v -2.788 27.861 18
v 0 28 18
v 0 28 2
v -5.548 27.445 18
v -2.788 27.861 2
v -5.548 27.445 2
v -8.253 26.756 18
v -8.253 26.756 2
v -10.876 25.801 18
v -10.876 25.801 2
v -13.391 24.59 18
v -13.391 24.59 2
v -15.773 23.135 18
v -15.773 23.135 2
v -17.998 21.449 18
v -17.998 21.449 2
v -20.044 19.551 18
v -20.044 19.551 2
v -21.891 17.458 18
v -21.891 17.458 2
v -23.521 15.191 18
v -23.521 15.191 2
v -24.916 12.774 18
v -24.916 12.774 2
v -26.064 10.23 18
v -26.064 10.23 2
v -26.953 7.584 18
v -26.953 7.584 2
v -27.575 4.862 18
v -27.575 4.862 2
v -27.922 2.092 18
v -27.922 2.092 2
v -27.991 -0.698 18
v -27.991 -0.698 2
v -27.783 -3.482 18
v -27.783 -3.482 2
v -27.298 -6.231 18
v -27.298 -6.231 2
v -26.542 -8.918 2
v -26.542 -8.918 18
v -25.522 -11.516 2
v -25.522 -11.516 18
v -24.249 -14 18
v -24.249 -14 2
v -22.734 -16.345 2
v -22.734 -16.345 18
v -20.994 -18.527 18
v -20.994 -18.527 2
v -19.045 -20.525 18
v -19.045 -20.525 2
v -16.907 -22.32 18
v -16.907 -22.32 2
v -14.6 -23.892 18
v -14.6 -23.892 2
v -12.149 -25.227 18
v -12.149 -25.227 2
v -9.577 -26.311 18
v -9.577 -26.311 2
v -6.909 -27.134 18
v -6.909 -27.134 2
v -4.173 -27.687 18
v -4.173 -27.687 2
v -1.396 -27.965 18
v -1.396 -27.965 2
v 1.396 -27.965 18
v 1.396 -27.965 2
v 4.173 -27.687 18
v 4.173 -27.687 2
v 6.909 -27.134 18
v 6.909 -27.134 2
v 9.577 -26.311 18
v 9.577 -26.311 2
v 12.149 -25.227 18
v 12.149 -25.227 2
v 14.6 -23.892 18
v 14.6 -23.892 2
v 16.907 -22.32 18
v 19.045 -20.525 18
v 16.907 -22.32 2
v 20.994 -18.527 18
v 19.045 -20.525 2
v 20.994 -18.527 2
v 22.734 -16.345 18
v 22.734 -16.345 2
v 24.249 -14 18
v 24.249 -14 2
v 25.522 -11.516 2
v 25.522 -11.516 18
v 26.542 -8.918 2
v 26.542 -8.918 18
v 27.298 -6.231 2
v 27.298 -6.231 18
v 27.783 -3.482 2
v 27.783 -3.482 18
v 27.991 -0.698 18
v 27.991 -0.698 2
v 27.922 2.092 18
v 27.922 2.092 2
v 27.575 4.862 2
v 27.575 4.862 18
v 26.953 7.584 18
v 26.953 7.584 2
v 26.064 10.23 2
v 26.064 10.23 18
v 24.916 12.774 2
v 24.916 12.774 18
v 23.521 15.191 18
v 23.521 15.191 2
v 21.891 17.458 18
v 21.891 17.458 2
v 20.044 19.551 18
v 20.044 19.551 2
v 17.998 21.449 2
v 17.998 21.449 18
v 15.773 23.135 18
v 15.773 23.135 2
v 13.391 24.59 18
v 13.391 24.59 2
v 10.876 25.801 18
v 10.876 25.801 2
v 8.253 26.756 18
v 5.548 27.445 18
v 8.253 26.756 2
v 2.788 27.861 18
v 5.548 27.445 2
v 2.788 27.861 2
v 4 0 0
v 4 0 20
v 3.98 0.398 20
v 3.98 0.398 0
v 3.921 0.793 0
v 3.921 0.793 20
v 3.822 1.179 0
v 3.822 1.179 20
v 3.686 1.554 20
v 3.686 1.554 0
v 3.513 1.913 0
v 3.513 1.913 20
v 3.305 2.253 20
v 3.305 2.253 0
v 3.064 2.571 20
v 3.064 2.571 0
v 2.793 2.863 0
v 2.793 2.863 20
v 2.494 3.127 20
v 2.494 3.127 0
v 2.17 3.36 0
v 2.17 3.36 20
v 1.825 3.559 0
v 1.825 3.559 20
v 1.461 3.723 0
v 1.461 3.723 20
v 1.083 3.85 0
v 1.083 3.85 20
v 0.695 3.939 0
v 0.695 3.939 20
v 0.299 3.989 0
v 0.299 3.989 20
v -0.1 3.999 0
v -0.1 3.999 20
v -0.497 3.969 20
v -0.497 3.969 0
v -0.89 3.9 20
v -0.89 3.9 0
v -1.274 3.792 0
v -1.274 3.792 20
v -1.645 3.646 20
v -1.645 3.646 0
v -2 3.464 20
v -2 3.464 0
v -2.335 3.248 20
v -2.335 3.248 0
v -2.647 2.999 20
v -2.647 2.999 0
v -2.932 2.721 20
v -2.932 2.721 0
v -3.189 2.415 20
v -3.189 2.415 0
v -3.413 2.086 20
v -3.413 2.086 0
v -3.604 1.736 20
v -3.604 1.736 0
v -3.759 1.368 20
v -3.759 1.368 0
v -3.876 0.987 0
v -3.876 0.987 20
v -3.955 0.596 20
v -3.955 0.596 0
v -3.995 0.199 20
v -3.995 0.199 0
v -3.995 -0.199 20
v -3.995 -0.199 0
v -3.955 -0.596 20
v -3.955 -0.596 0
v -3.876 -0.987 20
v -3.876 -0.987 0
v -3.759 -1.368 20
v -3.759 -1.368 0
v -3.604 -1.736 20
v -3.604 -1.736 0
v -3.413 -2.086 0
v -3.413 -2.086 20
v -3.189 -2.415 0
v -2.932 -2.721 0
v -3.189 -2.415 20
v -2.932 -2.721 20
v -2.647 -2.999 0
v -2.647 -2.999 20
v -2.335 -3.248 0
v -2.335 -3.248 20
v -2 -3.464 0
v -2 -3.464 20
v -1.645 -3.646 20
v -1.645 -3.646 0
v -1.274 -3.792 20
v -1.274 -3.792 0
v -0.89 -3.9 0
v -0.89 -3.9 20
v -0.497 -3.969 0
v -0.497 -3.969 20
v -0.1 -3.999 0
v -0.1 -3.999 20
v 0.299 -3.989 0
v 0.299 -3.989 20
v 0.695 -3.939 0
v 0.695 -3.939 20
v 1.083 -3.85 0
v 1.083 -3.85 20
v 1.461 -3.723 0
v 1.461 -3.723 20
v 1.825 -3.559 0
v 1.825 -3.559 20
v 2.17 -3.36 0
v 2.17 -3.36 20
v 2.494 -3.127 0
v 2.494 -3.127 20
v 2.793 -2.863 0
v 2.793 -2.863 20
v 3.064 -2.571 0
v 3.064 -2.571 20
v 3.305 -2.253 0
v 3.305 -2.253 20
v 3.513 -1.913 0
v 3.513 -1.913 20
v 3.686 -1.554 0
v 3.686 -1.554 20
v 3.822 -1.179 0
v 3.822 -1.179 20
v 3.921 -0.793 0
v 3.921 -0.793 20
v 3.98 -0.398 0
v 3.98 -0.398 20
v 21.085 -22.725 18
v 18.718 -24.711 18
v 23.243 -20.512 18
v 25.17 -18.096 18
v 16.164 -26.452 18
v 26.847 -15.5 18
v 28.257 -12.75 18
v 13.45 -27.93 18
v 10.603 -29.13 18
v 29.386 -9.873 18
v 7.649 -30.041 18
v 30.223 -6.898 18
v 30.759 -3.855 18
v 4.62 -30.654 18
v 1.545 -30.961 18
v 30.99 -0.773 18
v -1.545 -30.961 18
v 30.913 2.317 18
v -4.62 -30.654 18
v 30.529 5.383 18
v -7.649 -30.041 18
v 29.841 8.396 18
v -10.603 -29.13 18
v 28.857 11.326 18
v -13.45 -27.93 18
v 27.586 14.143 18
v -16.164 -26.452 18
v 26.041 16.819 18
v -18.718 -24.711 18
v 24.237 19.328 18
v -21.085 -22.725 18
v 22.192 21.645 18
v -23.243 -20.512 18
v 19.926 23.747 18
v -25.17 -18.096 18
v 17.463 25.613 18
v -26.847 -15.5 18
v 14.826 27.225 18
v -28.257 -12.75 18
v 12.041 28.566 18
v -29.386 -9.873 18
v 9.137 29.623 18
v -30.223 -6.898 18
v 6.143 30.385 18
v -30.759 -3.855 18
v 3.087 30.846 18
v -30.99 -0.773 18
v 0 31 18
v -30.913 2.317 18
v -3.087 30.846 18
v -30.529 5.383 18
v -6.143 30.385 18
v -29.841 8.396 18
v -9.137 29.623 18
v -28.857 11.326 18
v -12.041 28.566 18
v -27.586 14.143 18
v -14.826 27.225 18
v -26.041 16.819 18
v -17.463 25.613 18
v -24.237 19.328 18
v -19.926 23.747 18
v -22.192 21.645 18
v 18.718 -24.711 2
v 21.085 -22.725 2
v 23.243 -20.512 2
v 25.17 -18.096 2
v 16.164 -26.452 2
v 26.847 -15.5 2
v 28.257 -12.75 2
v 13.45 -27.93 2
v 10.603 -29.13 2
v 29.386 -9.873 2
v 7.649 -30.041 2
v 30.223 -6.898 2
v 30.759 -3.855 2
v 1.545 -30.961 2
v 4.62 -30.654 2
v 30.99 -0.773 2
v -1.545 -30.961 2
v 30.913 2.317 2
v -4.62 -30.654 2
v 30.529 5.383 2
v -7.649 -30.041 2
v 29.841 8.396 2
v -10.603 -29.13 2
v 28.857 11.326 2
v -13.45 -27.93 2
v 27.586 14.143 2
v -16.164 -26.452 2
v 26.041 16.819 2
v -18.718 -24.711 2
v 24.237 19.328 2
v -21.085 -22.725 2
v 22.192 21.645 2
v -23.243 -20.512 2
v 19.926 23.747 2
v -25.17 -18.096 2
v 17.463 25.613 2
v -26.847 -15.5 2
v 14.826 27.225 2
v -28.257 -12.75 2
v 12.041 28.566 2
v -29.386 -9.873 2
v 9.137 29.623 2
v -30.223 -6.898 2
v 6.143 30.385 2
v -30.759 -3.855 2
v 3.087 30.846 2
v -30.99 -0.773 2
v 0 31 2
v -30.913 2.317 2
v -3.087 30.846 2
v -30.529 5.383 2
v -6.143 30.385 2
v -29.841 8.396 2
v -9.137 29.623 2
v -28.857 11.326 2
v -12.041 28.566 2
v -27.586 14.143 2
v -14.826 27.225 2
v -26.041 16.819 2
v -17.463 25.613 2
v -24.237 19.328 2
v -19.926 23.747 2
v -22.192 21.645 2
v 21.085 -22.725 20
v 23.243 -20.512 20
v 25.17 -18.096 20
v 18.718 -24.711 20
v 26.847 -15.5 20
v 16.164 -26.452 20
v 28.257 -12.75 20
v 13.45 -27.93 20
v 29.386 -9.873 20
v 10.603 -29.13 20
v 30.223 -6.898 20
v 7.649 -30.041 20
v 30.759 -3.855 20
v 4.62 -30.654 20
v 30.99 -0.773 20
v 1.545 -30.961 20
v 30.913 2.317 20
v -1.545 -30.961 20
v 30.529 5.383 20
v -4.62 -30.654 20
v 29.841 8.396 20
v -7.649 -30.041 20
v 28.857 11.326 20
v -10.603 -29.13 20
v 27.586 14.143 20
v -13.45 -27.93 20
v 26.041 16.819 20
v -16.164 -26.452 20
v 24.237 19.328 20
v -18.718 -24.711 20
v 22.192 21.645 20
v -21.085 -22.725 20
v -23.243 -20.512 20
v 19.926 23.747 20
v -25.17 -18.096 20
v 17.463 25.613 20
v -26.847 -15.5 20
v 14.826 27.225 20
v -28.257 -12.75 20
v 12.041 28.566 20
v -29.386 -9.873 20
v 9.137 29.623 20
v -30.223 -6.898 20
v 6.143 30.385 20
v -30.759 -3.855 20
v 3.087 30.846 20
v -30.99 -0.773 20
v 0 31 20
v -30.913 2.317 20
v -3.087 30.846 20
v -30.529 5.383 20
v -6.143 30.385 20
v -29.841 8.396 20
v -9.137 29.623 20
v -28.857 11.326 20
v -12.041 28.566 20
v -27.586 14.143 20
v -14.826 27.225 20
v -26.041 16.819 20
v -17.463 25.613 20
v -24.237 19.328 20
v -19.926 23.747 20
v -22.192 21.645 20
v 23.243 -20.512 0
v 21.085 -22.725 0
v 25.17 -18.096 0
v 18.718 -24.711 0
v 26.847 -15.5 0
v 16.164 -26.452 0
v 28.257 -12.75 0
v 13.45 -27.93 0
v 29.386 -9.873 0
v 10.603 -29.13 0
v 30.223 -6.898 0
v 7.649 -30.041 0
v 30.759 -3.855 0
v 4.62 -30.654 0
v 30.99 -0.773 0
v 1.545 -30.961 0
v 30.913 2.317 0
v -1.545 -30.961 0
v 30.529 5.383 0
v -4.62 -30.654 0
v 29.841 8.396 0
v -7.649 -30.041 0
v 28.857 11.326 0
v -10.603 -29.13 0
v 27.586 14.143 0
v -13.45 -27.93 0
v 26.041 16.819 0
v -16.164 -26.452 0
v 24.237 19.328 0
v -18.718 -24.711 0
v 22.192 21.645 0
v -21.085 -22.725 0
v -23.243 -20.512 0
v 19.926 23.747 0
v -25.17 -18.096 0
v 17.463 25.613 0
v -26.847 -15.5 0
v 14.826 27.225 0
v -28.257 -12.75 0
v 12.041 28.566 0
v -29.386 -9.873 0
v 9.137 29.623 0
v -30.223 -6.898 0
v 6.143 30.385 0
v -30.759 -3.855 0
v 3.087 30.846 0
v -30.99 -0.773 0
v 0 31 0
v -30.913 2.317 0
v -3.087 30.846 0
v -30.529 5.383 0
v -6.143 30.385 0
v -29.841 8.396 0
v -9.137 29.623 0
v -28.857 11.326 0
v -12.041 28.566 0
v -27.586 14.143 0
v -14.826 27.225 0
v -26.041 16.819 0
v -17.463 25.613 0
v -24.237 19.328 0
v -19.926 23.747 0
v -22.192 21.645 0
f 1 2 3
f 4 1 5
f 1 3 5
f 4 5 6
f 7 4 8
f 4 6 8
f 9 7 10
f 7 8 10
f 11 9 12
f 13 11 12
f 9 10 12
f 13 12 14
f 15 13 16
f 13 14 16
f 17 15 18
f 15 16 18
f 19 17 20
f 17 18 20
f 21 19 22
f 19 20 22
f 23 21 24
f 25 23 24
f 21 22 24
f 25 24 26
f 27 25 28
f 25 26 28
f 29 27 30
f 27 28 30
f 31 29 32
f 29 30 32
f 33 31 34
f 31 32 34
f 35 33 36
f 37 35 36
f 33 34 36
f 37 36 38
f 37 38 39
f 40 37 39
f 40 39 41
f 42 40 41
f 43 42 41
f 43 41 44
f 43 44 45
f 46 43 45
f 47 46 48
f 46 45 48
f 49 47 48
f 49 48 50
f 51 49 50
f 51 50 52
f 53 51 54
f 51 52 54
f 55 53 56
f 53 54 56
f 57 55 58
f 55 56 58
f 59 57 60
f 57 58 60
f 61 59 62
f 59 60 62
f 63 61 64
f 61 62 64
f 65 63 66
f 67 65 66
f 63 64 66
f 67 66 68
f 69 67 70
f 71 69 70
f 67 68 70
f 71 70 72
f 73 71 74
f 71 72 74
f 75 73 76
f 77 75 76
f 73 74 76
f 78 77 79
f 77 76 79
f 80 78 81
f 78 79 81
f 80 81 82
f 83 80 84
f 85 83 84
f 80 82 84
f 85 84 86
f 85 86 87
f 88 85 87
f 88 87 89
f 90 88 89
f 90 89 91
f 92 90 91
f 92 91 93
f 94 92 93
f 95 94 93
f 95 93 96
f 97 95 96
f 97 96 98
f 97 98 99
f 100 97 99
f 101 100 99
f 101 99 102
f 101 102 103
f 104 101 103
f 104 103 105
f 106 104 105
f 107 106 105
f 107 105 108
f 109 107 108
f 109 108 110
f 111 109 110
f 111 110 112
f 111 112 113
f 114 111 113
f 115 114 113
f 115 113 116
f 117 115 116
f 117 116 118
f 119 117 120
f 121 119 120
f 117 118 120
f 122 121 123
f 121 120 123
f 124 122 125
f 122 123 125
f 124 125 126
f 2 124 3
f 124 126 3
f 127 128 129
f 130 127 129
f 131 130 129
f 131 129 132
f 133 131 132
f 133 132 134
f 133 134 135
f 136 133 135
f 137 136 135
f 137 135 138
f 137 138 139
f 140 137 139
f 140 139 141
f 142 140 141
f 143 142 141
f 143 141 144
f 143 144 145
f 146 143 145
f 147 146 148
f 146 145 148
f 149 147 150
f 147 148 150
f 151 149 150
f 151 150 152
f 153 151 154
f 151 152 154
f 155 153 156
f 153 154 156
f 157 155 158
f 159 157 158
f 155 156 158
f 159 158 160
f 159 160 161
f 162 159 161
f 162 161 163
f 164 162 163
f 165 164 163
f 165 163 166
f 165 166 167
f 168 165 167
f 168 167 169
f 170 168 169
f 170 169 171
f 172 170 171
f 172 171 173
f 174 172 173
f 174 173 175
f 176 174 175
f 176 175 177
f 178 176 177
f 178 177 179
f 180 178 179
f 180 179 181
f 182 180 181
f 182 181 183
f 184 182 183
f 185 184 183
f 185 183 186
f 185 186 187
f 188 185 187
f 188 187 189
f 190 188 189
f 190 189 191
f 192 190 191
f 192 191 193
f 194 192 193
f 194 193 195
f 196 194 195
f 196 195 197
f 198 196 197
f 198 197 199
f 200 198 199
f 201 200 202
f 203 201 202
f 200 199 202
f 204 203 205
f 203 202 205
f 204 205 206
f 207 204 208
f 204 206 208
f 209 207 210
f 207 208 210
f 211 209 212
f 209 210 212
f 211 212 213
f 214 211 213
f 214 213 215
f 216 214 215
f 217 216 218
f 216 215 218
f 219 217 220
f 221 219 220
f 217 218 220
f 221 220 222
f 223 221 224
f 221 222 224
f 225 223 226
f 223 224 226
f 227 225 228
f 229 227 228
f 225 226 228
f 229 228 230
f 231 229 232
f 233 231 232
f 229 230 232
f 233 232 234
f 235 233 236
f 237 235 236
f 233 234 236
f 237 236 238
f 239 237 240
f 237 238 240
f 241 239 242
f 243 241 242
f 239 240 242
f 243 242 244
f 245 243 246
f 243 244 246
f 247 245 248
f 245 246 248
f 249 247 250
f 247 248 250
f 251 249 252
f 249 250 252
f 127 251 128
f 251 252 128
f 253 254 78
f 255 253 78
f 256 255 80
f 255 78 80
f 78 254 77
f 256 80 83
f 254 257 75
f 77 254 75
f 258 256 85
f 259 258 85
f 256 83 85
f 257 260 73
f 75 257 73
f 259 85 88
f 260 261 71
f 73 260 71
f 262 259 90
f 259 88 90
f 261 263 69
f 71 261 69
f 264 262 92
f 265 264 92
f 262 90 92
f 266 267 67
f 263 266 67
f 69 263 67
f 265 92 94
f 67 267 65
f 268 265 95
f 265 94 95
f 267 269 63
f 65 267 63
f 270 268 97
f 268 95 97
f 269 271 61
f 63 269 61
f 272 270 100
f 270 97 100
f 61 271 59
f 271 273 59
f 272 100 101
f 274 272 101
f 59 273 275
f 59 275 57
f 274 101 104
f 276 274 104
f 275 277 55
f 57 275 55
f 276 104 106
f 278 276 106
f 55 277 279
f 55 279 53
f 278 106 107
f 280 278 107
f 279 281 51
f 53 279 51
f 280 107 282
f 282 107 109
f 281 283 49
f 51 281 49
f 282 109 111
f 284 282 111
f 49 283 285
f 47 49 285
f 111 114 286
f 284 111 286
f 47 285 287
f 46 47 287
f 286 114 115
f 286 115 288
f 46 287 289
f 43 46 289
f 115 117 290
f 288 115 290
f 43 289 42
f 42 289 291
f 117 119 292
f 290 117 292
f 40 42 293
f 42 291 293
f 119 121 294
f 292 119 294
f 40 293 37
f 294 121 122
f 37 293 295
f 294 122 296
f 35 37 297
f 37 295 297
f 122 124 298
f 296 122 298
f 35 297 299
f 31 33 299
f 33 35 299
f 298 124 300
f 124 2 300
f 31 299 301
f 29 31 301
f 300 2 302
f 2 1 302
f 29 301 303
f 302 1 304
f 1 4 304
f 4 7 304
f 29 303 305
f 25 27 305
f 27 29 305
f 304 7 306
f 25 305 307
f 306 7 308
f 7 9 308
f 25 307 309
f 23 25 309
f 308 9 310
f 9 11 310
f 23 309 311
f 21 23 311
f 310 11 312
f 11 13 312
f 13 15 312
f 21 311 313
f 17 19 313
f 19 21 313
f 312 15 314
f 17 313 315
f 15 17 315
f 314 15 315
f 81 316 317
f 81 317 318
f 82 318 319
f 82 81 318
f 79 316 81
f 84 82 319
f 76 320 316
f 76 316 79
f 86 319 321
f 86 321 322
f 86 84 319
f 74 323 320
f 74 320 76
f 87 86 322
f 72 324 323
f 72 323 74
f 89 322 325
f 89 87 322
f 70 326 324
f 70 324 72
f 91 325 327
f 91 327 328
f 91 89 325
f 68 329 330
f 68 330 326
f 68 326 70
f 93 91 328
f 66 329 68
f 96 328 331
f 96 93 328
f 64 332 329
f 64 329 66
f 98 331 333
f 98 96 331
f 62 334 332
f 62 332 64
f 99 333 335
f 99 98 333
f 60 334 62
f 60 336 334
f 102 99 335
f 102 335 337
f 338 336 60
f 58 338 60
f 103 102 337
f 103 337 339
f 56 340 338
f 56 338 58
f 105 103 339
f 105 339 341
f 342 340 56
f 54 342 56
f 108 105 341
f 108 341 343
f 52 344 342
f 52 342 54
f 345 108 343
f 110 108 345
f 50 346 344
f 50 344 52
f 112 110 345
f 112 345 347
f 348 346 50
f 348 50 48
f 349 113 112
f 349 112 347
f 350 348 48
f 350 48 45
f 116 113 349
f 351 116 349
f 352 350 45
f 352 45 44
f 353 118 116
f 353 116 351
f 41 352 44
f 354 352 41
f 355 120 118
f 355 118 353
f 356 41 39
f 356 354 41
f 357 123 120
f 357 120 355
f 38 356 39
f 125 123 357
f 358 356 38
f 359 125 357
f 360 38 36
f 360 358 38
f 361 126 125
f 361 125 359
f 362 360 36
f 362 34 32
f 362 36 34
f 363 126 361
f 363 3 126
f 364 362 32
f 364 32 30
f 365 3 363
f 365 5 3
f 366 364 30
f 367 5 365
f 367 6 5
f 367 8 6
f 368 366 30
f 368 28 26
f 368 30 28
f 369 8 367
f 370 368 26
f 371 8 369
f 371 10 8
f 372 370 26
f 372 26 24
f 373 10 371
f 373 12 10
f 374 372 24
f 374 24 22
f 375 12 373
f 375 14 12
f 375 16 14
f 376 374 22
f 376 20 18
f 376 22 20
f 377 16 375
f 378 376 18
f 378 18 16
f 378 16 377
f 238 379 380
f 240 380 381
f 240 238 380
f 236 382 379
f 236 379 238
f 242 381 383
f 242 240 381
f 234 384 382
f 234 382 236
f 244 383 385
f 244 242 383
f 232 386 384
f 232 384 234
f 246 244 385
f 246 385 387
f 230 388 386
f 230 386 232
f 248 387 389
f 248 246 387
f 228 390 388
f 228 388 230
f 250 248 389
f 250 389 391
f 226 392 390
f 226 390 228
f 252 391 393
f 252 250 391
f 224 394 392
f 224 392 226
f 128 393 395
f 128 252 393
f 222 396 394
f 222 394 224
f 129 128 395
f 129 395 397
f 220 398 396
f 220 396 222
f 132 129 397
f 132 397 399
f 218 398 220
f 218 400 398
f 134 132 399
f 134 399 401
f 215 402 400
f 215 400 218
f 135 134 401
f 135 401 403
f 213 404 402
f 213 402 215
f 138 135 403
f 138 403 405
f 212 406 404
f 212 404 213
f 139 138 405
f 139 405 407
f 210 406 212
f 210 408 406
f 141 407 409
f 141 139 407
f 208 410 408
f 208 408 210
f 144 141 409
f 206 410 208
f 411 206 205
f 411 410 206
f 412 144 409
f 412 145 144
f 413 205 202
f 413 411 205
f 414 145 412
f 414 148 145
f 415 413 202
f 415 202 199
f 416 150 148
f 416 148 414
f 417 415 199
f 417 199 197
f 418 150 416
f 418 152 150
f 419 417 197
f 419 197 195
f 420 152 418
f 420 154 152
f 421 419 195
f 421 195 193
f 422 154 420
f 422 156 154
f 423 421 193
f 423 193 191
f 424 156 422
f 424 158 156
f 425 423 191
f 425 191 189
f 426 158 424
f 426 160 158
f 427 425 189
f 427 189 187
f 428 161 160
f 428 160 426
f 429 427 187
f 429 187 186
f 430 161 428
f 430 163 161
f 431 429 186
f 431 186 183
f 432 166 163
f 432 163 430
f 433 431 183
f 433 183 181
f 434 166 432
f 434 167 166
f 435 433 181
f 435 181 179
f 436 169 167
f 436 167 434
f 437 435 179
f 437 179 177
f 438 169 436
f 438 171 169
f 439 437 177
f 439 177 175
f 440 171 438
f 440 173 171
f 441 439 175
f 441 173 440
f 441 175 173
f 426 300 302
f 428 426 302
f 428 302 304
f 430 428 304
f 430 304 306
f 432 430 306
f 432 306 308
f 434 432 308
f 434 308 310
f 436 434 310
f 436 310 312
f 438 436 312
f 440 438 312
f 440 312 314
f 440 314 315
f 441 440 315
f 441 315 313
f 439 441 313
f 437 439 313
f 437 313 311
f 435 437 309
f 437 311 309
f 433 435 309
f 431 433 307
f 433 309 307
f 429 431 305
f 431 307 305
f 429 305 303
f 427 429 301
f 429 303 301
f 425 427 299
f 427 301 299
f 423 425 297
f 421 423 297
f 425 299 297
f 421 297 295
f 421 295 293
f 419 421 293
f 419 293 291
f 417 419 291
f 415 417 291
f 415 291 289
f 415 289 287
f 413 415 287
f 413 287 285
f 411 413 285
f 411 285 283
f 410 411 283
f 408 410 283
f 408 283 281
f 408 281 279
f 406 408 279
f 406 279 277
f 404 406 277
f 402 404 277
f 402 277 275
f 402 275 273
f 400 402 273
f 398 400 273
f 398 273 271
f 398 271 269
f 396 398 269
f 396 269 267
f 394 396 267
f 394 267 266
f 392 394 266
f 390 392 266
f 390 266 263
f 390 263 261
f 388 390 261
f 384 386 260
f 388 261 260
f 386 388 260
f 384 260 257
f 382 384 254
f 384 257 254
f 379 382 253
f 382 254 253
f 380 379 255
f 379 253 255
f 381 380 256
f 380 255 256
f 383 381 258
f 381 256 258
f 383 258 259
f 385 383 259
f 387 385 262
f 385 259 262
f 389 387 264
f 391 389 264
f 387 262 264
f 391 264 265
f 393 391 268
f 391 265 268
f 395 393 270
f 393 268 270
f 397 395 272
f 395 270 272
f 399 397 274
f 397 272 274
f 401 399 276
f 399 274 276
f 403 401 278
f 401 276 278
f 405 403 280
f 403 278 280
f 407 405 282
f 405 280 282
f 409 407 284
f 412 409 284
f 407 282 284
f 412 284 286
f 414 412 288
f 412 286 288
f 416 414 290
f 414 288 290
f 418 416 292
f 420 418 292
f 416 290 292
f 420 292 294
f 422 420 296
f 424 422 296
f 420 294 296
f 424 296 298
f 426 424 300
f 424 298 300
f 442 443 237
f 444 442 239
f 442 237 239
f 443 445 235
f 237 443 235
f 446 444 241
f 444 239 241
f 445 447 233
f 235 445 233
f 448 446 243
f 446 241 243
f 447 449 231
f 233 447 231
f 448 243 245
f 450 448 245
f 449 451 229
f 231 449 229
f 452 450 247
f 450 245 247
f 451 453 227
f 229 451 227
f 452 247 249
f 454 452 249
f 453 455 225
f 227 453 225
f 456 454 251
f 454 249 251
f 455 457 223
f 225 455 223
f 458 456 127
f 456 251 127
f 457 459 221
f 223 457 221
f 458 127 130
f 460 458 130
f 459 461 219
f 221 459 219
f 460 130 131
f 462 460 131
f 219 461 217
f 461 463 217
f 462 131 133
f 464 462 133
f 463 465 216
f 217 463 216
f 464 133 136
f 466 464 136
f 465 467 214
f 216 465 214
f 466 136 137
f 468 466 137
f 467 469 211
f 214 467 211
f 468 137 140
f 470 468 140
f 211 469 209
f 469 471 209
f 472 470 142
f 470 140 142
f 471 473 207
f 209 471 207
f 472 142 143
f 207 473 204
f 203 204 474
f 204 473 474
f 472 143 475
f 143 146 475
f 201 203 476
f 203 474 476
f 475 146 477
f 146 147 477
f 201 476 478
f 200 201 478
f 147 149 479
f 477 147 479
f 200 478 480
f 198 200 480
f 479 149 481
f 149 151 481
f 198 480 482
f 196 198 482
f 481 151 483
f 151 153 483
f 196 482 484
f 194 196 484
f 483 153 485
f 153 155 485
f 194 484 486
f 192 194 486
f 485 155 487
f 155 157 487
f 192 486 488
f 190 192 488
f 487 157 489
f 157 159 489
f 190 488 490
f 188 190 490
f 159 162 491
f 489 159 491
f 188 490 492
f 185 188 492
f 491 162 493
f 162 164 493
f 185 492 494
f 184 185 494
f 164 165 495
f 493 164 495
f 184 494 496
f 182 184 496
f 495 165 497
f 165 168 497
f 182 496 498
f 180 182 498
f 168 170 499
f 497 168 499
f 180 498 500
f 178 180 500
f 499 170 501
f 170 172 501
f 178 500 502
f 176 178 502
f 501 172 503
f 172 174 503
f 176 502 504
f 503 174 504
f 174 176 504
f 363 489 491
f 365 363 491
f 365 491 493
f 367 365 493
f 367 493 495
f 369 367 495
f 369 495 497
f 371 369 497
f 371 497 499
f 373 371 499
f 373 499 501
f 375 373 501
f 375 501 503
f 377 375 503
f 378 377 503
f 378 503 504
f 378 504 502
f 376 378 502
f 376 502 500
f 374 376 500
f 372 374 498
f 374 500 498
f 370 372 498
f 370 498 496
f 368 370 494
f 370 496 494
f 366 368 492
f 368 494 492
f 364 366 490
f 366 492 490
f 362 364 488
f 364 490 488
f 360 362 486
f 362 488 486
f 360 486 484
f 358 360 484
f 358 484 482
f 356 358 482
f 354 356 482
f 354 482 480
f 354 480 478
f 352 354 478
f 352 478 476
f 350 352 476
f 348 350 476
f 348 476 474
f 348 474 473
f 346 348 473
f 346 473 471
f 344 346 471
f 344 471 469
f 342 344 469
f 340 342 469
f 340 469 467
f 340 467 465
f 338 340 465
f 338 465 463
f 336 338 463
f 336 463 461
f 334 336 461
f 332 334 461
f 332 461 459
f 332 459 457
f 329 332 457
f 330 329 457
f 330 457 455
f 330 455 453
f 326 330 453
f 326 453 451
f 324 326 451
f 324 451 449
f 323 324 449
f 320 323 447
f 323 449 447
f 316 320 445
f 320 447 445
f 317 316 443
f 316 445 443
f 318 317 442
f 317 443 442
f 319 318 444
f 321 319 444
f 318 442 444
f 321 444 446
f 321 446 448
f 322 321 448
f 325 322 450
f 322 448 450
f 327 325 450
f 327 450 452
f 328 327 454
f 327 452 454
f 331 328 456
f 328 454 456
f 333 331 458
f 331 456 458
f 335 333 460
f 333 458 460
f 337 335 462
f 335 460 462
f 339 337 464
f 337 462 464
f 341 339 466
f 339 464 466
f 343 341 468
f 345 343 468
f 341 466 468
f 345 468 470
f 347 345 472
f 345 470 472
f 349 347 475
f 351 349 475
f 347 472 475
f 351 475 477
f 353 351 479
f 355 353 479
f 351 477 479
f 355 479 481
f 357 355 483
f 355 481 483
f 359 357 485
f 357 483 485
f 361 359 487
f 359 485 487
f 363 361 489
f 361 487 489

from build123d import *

# Parameters (mm, degrees)
SKETCH1_R           = 31
BOSS_EXTRUDE1_DEPTH = 20
SKETCH2_R           = 31
SKETCH2_R_2         = 28
CUT_EXTRUDE1_DEPTH  = 16
SKETCH3_R           = 4
CUT_EXTRUDE2_DEPTH  = 21


with BuildPart() as part:
    # Sketch1 → Boss-Extrude1 (new body)
    with BuildSketch(Plane(origin=(0, 0, 0), x_dir=(0, 1, 0), z_dir=(0, 0, 1))):
        Circle(SKETCH1_R)
    extrude(amount=BOSS_EXTRUDE1_DEPTH)

    # Sketch2 → Cut-Extrude1 (cut)
    with BuildSketch(Plane(origin=(0, 0, 2), x_dir=(0, 1, 0), z_dir=(0, 0, 1))):
        Circle(SKETCH2_R)
        Circle(SKETCH2_R_2, mode=Mode.SUBTRACT)
    extrude(amount=CUT_EXTRUDE1_DEPTH, mode=Mode.SUBTRACT)

    # Sketch3 → Cut-Extrude2 (cut, through all)
    with BuildSketch(Plane.XY.offset(20)):
        Circle(SKETCH3_R)
    extrude(amount=-CUT_EXTRUDE2_DEPTH, mode=Mode.SUBTRACT)


solid = part.part
